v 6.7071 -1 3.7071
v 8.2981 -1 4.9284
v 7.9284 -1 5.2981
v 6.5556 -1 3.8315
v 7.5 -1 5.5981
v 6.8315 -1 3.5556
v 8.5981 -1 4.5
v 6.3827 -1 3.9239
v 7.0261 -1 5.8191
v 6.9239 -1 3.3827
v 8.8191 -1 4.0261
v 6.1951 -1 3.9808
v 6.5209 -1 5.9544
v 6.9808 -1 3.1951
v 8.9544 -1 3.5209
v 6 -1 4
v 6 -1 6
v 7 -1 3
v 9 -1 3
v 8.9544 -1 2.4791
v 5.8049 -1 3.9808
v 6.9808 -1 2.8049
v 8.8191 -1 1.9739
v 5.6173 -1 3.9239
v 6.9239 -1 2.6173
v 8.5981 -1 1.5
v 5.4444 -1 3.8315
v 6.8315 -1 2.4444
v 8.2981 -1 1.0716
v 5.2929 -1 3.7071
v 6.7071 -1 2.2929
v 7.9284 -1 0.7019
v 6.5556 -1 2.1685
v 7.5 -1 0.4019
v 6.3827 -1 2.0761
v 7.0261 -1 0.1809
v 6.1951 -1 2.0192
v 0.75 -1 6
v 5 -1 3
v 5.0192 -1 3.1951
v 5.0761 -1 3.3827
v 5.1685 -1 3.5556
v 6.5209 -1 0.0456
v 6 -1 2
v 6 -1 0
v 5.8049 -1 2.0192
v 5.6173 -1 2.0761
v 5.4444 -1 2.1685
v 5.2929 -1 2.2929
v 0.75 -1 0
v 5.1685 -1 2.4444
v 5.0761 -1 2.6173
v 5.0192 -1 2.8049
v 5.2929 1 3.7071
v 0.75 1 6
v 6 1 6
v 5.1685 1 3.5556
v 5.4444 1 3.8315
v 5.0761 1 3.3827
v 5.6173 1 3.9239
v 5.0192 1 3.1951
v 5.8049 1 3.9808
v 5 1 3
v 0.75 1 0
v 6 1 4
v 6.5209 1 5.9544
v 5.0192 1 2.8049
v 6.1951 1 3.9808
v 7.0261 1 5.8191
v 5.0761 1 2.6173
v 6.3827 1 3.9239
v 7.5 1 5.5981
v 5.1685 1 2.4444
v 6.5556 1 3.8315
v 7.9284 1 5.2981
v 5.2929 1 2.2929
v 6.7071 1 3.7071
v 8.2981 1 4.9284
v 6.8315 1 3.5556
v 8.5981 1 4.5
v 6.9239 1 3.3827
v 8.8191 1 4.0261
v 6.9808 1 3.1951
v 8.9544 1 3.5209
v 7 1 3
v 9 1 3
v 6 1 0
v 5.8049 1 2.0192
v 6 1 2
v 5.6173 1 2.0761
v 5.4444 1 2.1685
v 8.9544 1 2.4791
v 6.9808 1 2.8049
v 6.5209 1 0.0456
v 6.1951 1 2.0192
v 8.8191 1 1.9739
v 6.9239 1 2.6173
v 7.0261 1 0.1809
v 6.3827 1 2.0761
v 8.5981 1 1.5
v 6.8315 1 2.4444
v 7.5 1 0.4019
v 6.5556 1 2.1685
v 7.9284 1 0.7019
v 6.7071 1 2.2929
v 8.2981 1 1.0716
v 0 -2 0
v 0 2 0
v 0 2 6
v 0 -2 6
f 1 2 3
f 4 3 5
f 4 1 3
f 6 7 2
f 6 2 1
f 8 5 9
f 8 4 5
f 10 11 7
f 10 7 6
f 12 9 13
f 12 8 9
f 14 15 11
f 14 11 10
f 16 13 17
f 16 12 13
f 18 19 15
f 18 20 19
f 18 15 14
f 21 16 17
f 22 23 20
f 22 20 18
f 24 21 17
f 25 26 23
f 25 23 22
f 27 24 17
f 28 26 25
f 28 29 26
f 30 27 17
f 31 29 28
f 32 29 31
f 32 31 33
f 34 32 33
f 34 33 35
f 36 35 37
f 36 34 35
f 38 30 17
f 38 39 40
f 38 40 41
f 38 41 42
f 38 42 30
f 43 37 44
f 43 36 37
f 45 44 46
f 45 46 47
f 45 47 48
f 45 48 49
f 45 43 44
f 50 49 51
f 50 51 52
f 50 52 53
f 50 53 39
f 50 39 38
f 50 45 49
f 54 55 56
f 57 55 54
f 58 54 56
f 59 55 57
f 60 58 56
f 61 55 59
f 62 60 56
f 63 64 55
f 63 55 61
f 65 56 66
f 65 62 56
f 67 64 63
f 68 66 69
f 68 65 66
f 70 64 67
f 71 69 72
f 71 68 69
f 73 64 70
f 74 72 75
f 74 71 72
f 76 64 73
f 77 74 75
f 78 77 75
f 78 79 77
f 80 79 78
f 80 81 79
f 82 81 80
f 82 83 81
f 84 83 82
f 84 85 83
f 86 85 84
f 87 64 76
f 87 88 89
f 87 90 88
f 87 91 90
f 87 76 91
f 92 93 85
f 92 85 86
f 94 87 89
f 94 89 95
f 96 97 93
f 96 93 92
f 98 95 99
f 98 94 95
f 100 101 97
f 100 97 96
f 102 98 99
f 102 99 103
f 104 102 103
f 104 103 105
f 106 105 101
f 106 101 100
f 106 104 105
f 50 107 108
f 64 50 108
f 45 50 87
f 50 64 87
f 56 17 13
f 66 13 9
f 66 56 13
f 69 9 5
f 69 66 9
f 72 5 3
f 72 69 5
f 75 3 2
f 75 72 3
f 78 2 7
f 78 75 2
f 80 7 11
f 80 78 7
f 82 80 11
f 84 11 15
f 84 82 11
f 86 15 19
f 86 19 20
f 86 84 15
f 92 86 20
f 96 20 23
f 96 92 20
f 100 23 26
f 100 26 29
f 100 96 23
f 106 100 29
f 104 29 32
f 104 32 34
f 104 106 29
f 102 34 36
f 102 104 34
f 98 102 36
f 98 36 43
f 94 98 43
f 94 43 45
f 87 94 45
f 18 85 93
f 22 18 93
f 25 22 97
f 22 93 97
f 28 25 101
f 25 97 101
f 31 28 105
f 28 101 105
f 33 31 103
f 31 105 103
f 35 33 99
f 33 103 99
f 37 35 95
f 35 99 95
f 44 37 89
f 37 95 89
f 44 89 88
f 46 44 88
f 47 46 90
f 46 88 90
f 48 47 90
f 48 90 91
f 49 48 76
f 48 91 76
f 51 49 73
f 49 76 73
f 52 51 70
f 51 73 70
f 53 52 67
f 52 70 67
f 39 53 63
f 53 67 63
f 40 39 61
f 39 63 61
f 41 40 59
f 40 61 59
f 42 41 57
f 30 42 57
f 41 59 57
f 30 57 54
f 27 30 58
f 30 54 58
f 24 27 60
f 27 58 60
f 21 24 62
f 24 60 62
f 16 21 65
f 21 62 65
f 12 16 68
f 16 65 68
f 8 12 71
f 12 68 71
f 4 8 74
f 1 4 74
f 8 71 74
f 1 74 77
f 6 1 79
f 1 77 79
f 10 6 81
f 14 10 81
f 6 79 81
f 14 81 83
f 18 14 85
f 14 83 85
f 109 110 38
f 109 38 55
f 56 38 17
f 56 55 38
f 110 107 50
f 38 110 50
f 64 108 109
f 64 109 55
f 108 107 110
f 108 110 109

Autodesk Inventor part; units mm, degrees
ref_plane "YZ Plane" through (0, 0, 0) normal (1, 0, 0) x (0, 1, 0)
ref_plane "XZ Plane" through (0, 0, 0) normal (0, 1, 0) x (-1, 0, 0)
ref_plane "XY Plane" through (0, 0, 0) normal (0, 0, 1) x (1, 0, 0)
sketch "Sketch1" plane through (0, 0, 0) normal (0, 0, 1) x (1, 0, 0)
  line L0 (-3, 3) -> (3, -3) construction
  line L1 (3, 3) -> (-3, -3) construction
  line L2 (0, 1) -> (3, 1)
  line L3 (3, 1) -> (3, -1)
  line L4 (3, -1) -> (0, -1)
  line L5 (0, -1) -> (0, 1)
  line L6 (0, 1) -> (3, -1) construction
  line L7 (3, 1) -> (0, -1) construction
  line L8 (0, 1) -> (0, 2)
  line L9 (0, 2) -> (1.5, 0)
  line L10 (0, -1) -> (0, -2)
  line L11 (0, -2) -> (1.5, 0)
  point P0 (0, 0)
  point P1 (0, 0)
  point P2 (0.75, 1)
  point P3 (0.75, -1)
  dimension "d0" = 6
  dimension "d1" = 2
  dimension "d2" = 3
  dimension "d3" = 1
extrude "Extrusion1" add sketch "Sketch1" along normal blind 6
sketch "Sketch2" plane through (3, -1, 0) normal (1, 0, 0) x (0, 0, -1)
  point P0 (0, 1)
sketch "Sketch3" plane through (0.75, 1, 0) normal (0, 1, 0) x (1, 0, 0)
  circle A0 centre (5.25, -3) radius 3
  line L0 (2.25, 0) -> (2.25, -6) projected
  line L1 (2.25, 0) -> (2.25, -6) projected
  line L2 (2.25, -6) -> (0, -6) projected
  line L3 (5.25, -6) -> (2.25, -6)
  line L4 (5.25, 0) -> (2.25, 0)
  line L5 (2.25, -6) -> (2.25, 0)
  circle A1 centre (5.25, -3) radius 1
  point P0 (-0.75, 0)
  point P1 (2.25, -3)
  point P2 (2.25, -3)
  dimension "d6" = 6
  dimension "d7" = 2
extrude "Extrusion2" add sketch "Sketch3" against normal up to surface (2 mm away)
properties part number "LinearSlider"
